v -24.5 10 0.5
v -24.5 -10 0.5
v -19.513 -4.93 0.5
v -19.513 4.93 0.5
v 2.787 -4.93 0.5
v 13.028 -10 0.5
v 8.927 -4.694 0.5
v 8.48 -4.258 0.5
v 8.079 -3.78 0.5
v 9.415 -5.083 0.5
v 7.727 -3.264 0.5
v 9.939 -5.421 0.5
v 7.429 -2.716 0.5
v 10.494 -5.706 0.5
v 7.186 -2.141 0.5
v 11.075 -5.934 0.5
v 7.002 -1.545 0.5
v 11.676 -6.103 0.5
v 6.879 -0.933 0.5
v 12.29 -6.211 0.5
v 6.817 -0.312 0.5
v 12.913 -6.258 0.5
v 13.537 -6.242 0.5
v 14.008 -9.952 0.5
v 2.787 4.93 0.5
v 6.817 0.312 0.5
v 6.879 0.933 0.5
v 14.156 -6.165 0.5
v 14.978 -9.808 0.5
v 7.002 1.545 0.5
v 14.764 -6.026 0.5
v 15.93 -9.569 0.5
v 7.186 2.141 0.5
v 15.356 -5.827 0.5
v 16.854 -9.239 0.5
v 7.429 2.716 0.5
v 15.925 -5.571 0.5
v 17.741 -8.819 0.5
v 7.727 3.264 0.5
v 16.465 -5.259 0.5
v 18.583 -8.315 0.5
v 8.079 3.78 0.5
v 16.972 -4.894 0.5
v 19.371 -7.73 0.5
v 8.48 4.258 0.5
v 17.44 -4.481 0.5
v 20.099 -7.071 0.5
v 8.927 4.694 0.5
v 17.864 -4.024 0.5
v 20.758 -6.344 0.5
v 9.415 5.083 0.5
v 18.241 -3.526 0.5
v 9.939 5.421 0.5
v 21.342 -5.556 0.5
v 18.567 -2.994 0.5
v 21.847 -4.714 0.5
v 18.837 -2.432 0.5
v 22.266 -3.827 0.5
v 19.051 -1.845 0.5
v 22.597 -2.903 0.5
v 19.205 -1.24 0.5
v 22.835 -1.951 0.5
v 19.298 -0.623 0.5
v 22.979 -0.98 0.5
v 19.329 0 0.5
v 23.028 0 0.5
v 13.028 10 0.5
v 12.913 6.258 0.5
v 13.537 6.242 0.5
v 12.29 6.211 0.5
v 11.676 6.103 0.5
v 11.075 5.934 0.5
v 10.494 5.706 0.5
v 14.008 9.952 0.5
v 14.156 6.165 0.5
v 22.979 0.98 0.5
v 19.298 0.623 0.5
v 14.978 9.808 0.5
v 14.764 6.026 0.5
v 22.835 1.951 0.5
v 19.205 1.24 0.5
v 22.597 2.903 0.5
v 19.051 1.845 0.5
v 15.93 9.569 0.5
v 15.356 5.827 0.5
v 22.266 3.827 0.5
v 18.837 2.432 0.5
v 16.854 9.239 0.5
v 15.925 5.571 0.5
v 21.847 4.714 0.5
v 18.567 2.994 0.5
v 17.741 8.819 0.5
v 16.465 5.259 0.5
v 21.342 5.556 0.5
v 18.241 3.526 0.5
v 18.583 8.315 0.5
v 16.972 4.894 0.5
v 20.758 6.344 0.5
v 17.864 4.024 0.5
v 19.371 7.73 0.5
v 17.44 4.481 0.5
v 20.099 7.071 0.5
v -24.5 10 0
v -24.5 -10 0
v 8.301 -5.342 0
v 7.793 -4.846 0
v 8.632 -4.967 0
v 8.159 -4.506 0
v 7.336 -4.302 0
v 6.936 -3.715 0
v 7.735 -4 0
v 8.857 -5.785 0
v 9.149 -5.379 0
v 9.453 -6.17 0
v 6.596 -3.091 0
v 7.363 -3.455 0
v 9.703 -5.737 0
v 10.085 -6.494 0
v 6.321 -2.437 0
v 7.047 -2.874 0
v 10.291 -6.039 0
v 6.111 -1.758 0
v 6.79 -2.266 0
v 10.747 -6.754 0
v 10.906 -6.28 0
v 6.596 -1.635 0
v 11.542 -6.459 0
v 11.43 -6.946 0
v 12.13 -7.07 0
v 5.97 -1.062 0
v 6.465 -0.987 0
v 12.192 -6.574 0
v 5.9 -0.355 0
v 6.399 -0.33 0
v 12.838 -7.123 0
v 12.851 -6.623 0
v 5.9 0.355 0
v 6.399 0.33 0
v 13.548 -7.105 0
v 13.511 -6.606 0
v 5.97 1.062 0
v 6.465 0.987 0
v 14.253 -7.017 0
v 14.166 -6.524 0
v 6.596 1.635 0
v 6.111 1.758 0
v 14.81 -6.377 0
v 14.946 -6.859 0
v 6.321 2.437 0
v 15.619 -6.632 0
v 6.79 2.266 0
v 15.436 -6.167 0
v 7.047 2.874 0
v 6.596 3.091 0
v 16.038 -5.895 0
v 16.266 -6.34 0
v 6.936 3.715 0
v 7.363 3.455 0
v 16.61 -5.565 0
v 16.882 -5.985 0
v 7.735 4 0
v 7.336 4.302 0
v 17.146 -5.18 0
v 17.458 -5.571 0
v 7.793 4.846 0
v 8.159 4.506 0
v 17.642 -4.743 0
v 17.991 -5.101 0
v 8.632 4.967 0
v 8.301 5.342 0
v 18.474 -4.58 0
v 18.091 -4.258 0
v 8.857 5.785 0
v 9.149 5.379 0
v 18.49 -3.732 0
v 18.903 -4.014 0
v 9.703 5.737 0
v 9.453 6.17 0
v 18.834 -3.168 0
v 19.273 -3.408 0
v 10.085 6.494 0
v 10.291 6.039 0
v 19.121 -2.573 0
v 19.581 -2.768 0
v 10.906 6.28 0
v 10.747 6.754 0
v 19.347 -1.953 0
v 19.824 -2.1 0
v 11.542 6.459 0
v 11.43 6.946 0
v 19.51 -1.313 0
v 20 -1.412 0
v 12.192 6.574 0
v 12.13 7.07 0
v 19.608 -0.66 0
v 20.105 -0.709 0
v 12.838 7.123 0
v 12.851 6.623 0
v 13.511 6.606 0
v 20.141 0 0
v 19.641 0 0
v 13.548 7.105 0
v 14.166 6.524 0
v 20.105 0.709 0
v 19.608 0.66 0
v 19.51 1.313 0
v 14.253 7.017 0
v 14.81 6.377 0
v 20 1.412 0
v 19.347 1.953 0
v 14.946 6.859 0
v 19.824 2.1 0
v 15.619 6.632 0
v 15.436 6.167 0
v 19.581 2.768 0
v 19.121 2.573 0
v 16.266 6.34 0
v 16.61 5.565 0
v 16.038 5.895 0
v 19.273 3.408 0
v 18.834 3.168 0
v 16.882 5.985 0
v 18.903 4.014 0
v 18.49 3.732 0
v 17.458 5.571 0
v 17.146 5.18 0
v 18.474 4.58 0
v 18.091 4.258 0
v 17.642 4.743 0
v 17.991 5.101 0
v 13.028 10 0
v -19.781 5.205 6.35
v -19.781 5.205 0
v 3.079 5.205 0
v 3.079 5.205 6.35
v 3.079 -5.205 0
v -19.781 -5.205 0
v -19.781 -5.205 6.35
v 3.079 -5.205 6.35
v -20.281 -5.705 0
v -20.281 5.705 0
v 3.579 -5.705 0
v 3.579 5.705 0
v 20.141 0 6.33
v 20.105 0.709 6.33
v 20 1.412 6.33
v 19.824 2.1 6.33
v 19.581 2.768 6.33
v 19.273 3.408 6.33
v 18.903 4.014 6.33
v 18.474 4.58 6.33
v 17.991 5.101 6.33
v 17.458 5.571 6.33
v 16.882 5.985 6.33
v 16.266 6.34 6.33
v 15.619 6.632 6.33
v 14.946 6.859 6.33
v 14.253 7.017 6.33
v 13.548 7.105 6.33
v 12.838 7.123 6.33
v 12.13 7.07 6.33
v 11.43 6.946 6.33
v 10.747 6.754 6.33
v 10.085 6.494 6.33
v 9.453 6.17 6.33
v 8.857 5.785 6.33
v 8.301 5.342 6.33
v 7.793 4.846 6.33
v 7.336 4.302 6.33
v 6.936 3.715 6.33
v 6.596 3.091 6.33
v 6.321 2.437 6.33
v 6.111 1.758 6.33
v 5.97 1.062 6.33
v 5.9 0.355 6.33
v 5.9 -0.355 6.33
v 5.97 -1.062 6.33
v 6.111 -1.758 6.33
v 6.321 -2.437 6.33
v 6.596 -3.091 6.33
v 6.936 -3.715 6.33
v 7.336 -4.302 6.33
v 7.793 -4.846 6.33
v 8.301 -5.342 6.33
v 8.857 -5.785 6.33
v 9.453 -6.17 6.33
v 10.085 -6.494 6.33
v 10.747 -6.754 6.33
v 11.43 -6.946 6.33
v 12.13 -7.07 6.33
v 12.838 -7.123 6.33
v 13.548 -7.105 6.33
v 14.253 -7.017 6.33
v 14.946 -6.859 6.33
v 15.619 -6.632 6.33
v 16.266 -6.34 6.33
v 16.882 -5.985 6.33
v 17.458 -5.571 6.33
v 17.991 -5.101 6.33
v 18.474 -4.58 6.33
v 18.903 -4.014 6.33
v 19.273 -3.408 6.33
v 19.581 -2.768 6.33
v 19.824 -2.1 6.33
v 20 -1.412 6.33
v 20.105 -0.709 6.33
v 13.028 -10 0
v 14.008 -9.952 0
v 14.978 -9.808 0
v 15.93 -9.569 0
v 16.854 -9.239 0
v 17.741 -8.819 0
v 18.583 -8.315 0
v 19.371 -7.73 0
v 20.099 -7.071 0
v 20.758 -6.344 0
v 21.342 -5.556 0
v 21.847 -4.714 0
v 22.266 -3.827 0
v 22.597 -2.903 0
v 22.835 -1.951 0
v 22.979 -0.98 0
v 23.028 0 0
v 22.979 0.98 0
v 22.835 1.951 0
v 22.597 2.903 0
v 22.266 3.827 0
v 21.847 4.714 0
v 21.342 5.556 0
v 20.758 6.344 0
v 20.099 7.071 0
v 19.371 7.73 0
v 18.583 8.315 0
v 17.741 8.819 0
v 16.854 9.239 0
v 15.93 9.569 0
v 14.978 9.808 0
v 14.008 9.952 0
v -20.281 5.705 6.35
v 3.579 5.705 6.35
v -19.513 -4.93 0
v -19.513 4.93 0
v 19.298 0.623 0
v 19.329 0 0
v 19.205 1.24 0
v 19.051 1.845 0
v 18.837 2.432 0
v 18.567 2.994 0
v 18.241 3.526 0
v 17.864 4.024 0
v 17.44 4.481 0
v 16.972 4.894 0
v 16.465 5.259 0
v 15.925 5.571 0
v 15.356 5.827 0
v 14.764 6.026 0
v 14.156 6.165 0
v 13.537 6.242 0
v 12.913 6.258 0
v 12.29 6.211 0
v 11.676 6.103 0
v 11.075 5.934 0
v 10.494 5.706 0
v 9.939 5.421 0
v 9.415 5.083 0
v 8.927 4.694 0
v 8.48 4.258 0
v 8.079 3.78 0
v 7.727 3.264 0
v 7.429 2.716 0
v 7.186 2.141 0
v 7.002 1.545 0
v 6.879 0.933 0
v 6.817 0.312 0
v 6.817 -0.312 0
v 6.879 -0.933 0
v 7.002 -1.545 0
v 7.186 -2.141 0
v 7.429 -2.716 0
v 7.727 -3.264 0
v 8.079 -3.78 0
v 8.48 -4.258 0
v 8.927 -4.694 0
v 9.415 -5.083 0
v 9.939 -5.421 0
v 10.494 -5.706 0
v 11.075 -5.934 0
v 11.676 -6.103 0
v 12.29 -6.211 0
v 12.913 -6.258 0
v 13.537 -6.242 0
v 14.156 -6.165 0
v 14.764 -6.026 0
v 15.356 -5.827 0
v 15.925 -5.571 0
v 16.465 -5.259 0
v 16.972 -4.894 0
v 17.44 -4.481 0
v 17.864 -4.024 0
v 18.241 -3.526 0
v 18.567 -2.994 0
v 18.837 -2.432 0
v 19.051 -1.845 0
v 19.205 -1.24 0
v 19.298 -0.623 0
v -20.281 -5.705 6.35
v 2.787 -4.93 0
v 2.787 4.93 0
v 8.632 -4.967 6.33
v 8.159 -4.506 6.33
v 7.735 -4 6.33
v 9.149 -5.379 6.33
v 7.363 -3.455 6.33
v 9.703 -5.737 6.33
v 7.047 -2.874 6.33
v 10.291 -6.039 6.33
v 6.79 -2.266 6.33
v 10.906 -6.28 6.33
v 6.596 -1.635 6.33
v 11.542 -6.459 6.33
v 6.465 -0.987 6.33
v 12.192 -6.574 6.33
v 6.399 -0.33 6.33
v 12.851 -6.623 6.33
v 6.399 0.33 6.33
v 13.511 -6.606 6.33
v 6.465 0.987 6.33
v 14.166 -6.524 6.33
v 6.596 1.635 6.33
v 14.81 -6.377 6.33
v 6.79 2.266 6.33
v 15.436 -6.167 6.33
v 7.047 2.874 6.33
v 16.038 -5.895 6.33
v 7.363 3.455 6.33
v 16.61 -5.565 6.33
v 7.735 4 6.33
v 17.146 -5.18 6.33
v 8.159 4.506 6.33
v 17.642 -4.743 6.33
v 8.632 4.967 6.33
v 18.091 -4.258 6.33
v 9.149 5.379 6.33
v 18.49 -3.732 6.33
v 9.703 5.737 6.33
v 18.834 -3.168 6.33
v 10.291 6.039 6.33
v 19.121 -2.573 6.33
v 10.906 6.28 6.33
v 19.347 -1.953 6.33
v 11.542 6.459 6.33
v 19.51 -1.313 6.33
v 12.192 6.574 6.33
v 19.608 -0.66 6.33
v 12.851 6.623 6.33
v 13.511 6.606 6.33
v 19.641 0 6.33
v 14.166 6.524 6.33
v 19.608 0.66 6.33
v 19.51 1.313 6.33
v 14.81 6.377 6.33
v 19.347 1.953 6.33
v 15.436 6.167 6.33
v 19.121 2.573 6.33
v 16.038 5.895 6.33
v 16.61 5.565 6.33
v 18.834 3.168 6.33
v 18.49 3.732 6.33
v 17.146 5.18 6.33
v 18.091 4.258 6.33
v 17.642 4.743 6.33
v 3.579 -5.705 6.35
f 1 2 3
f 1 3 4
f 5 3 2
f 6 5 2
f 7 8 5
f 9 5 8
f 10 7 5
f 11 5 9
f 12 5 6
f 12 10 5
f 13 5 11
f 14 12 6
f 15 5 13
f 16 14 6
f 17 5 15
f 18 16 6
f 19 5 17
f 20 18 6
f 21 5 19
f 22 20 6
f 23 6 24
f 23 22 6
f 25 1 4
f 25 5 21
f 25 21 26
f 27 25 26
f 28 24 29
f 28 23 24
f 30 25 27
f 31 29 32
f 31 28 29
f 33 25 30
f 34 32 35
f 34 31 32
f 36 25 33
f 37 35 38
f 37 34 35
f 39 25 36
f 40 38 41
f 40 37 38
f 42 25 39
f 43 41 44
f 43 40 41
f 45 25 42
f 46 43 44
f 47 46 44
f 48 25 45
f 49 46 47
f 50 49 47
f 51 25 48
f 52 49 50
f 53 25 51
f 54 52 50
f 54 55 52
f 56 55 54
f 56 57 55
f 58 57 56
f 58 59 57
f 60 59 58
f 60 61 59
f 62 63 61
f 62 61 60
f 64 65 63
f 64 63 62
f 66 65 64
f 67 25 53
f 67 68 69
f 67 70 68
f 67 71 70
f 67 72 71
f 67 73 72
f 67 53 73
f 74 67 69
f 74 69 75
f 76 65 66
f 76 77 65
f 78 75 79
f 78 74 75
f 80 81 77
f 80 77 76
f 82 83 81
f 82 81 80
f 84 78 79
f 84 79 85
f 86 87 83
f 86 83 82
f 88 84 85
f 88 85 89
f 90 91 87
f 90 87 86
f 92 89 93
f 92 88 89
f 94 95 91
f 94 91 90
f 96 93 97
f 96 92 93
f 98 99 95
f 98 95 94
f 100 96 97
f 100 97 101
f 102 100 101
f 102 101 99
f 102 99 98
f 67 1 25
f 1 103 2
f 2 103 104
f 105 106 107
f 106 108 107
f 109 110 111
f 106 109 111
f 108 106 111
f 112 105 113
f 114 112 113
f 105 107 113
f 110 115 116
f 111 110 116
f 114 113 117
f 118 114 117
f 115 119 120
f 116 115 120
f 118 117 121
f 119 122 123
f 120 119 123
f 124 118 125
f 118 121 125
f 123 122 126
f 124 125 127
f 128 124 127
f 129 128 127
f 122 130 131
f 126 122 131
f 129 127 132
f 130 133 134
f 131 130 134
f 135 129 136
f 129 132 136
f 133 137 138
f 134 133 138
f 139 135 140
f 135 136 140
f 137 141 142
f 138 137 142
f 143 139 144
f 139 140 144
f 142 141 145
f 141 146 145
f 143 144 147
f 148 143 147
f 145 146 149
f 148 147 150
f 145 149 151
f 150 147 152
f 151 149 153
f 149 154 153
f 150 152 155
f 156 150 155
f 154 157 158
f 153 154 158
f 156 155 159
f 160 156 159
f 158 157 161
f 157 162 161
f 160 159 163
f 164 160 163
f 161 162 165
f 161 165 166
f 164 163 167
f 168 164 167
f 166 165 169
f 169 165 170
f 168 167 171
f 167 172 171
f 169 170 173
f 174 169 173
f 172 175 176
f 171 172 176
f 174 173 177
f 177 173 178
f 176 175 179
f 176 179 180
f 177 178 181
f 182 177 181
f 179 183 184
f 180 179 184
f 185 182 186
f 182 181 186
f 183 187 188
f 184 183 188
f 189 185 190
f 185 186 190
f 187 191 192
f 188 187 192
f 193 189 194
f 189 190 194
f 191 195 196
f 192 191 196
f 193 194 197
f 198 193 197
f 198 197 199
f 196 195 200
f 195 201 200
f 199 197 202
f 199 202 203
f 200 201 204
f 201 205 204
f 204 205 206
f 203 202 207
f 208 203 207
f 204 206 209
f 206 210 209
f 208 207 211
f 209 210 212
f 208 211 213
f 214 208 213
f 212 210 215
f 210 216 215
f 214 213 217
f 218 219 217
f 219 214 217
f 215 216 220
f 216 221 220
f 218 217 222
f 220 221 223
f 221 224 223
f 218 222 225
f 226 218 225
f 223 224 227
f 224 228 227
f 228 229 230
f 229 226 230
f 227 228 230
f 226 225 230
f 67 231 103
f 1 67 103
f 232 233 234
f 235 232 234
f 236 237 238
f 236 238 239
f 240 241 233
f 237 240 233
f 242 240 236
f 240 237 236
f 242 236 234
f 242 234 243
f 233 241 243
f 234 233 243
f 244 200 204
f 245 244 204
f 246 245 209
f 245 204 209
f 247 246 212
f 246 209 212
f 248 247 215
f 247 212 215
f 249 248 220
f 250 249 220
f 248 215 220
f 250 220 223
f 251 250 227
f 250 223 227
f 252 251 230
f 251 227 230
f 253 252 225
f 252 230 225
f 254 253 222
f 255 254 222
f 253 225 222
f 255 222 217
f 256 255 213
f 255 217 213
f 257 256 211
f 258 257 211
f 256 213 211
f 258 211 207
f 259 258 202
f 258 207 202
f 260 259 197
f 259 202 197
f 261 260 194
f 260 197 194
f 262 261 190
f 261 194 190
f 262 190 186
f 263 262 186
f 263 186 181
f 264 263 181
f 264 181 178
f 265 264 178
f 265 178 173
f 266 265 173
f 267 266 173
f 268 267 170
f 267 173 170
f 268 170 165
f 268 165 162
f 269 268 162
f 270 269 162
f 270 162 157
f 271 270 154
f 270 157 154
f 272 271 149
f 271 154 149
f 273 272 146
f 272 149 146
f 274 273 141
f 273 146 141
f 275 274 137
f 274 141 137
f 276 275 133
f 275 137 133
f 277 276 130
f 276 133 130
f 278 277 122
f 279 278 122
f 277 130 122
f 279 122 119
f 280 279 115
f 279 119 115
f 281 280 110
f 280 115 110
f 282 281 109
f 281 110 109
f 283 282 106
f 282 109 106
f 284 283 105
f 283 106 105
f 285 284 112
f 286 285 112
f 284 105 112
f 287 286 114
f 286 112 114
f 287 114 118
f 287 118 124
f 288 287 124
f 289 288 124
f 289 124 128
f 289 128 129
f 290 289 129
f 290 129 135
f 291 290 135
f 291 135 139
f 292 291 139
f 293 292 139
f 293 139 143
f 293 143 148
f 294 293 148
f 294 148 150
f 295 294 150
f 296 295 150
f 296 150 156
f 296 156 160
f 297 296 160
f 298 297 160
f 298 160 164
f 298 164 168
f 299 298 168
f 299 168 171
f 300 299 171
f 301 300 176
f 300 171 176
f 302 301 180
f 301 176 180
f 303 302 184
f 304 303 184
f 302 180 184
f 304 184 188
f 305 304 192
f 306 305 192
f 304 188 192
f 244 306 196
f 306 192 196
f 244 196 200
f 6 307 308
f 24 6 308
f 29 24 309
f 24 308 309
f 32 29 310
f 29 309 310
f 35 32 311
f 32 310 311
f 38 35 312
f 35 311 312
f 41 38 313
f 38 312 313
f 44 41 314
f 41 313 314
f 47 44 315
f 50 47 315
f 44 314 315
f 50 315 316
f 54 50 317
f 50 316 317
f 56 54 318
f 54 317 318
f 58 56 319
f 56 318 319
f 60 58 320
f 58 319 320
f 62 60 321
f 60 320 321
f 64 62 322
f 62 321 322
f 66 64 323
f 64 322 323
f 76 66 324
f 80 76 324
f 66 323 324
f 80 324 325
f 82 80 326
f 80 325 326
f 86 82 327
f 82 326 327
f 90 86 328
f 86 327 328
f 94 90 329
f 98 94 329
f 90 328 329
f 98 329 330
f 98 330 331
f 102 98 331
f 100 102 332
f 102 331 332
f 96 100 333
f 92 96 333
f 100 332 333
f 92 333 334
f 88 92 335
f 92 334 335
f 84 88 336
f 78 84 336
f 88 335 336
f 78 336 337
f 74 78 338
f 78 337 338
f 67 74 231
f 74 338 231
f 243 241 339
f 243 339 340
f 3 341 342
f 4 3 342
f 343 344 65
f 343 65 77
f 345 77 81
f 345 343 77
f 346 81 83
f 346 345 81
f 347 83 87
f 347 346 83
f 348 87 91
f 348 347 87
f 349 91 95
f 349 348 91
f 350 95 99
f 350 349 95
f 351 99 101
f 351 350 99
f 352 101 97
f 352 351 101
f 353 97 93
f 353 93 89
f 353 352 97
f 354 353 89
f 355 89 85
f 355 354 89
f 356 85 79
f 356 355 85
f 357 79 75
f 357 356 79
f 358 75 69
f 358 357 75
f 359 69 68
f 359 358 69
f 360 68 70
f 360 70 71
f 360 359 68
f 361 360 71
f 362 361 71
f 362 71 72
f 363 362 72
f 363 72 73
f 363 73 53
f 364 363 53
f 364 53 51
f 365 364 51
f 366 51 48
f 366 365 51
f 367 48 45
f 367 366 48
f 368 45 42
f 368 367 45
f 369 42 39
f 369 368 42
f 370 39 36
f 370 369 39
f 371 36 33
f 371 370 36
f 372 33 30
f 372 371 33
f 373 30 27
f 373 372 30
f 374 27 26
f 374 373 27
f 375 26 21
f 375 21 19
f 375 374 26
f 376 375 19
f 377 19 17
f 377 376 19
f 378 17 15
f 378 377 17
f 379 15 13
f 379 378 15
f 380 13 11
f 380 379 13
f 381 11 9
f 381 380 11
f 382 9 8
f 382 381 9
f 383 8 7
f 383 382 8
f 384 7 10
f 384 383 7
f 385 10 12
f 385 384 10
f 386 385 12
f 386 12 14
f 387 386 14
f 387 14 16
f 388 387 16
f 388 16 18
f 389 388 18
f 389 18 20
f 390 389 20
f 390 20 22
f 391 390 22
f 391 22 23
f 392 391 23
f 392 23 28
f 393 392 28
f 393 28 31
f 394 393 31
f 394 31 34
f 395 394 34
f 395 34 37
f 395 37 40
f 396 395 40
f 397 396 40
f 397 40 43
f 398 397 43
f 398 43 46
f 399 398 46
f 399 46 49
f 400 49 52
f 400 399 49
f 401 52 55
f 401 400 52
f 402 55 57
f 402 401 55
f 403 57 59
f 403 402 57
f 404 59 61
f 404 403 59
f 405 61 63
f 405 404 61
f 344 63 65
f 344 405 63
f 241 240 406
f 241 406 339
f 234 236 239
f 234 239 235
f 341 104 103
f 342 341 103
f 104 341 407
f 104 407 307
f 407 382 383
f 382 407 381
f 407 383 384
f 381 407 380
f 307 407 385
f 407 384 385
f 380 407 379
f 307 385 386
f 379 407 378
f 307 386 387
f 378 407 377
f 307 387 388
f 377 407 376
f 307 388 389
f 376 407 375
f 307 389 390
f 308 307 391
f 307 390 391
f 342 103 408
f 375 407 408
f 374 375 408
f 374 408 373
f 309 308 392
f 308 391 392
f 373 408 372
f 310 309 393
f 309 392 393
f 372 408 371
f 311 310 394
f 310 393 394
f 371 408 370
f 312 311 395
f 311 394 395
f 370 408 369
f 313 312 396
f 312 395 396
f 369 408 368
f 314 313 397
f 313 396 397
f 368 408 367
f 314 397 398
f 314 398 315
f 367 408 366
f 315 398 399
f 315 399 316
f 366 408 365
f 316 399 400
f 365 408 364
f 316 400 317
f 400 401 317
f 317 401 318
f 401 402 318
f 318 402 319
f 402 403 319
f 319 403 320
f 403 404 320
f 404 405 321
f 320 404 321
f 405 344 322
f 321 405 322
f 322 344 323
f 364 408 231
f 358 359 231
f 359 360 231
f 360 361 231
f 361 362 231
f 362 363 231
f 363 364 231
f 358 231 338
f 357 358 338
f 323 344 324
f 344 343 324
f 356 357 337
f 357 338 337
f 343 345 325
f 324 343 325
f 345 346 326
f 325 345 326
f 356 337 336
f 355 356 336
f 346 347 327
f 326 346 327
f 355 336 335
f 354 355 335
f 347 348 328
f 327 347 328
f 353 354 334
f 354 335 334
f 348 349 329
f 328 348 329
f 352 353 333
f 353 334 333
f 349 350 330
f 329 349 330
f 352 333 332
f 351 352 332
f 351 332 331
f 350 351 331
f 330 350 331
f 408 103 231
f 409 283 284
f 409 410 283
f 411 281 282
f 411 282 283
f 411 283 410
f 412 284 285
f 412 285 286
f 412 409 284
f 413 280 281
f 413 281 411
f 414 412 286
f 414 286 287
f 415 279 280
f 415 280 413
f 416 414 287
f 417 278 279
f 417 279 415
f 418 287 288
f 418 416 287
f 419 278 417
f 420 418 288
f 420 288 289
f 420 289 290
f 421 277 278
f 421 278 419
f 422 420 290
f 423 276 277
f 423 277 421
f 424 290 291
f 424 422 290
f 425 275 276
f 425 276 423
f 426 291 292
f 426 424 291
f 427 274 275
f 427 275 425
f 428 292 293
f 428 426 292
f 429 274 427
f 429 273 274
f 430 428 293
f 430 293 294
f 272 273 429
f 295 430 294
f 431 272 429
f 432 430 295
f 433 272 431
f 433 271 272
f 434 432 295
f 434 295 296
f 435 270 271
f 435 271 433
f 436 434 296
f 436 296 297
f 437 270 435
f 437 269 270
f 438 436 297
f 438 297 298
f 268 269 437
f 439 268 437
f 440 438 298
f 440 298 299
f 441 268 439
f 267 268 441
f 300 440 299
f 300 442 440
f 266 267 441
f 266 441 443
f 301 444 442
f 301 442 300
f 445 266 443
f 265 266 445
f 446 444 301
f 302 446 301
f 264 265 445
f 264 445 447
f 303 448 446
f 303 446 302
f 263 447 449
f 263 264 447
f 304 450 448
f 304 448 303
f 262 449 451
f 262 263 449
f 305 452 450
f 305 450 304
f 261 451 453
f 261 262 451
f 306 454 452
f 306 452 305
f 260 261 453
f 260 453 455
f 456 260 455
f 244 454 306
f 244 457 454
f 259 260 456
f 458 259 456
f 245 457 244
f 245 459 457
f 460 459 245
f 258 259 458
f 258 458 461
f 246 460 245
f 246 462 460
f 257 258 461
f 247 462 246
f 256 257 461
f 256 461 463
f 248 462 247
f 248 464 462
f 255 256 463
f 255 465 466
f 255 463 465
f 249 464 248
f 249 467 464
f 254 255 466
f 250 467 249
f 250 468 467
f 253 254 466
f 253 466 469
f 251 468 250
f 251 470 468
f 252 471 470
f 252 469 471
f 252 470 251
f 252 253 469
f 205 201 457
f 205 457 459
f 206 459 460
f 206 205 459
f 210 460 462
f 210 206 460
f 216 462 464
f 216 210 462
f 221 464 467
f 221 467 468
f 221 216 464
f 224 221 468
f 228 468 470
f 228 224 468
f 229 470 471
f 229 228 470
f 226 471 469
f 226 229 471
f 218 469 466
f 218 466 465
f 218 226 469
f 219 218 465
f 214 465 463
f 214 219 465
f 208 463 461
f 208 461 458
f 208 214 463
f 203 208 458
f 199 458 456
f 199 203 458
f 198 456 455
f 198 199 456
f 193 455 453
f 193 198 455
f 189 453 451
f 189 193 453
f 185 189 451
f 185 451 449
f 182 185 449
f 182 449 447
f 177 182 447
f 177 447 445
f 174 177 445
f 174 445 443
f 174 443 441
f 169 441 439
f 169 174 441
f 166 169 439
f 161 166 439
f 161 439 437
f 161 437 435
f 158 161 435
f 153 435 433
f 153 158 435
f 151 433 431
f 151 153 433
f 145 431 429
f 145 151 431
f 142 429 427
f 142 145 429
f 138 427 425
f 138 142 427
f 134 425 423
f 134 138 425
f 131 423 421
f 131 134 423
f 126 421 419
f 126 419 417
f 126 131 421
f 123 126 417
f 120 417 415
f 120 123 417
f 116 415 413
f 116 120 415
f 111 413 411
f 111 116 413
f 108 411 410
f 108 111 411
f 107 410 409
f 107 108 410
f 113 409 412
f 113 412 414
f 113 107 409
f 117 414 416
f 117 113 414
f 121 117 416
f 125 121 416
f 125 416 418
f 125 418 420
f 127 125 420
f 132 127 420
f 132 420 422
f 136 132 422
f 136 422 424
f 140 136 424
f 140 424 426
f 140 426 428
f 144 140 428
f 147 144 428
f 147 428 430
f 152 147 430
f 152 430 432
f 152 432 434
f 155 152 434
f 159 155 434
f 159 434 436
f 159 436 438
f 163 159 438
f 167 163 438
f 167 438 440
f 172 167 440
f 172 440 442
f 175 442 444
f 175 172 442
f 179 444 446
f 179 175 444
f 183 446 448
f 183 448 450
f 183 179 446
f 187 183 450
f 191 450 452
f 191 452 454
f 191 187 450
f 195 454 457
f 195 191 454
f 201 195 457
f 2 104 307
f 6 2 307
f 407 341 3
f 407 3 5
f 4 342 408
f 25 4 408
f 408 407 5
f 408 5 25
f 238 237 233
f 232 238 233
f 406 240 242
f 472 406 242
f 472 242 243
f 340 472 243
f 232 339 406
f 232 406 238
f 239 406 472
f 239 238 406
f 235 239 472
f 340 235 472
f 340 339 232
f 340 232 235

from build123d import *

# Parameters (mm, degrees)
F0_W     = 22.3
F0_H     = 9.86
F0_R     = 6.26
F1_DEPTH = 0.5
F3_R     = 7.125
F3_R_2   = 6.625
F4_DEPTH = 6.33
F5_W     = 23.86
F5_H     = 11.41
F5_W_2   = 22.86
F5_H_2   = 10.41
F6_DEPTH = 6.35


with BuildPart() as f1:
    # F0 (on Top) → F1 (new body)
    with BuildSketch(Plane.XY):
        with BuildLine():
            Line((-24.5, 10), (-24.5, -10))
            Line((-24.5, -10), (13.027523, -10))
            ThreePointArc((13.027523, -10), (23.027523, 0), (13.027523, 10))
            Line((13.027523, 10), (-24.5, 10))
        make_face()
        with Locations((-8.363491, 0)):
            Rectangle(F0_W, F0_H, mode=Mode.SUBTRACT)
        with Locations((13.068863, 0)):
            Circle(F0_R, mode=Mode.SUBTRACT)
    extrude(amount=F1_DEPTH)


with BuildPart() as f4:
    # F3 (on Top) → F4 (new body)
    with BuildSketch(Plane.XY):
        with Locations((13.015863, 0)):
            Circle(F3_R)
        with Locations((13.015863, 0)):
            Circle(F3_R_2, mode=Mode.SUBTRACT)
    extrude(amount=F4_DEPTH)


with BuildPart() as f6:
    # F5 (on Top) → F6 (new body)
    with BuildSketch(Plane.XY):
        with Locations((-8.350817, 0)):
            Rectangle(F5_W, F5_H)
        with Locations((-8.350817, 0)):
            Rectangle(F5_W_2, F5_H_2, mode=Mode.SUBTRACT)
    extrude(amount=F6_DEPTH)


solid = Compound([f1.part, f4.part, f6.part])
